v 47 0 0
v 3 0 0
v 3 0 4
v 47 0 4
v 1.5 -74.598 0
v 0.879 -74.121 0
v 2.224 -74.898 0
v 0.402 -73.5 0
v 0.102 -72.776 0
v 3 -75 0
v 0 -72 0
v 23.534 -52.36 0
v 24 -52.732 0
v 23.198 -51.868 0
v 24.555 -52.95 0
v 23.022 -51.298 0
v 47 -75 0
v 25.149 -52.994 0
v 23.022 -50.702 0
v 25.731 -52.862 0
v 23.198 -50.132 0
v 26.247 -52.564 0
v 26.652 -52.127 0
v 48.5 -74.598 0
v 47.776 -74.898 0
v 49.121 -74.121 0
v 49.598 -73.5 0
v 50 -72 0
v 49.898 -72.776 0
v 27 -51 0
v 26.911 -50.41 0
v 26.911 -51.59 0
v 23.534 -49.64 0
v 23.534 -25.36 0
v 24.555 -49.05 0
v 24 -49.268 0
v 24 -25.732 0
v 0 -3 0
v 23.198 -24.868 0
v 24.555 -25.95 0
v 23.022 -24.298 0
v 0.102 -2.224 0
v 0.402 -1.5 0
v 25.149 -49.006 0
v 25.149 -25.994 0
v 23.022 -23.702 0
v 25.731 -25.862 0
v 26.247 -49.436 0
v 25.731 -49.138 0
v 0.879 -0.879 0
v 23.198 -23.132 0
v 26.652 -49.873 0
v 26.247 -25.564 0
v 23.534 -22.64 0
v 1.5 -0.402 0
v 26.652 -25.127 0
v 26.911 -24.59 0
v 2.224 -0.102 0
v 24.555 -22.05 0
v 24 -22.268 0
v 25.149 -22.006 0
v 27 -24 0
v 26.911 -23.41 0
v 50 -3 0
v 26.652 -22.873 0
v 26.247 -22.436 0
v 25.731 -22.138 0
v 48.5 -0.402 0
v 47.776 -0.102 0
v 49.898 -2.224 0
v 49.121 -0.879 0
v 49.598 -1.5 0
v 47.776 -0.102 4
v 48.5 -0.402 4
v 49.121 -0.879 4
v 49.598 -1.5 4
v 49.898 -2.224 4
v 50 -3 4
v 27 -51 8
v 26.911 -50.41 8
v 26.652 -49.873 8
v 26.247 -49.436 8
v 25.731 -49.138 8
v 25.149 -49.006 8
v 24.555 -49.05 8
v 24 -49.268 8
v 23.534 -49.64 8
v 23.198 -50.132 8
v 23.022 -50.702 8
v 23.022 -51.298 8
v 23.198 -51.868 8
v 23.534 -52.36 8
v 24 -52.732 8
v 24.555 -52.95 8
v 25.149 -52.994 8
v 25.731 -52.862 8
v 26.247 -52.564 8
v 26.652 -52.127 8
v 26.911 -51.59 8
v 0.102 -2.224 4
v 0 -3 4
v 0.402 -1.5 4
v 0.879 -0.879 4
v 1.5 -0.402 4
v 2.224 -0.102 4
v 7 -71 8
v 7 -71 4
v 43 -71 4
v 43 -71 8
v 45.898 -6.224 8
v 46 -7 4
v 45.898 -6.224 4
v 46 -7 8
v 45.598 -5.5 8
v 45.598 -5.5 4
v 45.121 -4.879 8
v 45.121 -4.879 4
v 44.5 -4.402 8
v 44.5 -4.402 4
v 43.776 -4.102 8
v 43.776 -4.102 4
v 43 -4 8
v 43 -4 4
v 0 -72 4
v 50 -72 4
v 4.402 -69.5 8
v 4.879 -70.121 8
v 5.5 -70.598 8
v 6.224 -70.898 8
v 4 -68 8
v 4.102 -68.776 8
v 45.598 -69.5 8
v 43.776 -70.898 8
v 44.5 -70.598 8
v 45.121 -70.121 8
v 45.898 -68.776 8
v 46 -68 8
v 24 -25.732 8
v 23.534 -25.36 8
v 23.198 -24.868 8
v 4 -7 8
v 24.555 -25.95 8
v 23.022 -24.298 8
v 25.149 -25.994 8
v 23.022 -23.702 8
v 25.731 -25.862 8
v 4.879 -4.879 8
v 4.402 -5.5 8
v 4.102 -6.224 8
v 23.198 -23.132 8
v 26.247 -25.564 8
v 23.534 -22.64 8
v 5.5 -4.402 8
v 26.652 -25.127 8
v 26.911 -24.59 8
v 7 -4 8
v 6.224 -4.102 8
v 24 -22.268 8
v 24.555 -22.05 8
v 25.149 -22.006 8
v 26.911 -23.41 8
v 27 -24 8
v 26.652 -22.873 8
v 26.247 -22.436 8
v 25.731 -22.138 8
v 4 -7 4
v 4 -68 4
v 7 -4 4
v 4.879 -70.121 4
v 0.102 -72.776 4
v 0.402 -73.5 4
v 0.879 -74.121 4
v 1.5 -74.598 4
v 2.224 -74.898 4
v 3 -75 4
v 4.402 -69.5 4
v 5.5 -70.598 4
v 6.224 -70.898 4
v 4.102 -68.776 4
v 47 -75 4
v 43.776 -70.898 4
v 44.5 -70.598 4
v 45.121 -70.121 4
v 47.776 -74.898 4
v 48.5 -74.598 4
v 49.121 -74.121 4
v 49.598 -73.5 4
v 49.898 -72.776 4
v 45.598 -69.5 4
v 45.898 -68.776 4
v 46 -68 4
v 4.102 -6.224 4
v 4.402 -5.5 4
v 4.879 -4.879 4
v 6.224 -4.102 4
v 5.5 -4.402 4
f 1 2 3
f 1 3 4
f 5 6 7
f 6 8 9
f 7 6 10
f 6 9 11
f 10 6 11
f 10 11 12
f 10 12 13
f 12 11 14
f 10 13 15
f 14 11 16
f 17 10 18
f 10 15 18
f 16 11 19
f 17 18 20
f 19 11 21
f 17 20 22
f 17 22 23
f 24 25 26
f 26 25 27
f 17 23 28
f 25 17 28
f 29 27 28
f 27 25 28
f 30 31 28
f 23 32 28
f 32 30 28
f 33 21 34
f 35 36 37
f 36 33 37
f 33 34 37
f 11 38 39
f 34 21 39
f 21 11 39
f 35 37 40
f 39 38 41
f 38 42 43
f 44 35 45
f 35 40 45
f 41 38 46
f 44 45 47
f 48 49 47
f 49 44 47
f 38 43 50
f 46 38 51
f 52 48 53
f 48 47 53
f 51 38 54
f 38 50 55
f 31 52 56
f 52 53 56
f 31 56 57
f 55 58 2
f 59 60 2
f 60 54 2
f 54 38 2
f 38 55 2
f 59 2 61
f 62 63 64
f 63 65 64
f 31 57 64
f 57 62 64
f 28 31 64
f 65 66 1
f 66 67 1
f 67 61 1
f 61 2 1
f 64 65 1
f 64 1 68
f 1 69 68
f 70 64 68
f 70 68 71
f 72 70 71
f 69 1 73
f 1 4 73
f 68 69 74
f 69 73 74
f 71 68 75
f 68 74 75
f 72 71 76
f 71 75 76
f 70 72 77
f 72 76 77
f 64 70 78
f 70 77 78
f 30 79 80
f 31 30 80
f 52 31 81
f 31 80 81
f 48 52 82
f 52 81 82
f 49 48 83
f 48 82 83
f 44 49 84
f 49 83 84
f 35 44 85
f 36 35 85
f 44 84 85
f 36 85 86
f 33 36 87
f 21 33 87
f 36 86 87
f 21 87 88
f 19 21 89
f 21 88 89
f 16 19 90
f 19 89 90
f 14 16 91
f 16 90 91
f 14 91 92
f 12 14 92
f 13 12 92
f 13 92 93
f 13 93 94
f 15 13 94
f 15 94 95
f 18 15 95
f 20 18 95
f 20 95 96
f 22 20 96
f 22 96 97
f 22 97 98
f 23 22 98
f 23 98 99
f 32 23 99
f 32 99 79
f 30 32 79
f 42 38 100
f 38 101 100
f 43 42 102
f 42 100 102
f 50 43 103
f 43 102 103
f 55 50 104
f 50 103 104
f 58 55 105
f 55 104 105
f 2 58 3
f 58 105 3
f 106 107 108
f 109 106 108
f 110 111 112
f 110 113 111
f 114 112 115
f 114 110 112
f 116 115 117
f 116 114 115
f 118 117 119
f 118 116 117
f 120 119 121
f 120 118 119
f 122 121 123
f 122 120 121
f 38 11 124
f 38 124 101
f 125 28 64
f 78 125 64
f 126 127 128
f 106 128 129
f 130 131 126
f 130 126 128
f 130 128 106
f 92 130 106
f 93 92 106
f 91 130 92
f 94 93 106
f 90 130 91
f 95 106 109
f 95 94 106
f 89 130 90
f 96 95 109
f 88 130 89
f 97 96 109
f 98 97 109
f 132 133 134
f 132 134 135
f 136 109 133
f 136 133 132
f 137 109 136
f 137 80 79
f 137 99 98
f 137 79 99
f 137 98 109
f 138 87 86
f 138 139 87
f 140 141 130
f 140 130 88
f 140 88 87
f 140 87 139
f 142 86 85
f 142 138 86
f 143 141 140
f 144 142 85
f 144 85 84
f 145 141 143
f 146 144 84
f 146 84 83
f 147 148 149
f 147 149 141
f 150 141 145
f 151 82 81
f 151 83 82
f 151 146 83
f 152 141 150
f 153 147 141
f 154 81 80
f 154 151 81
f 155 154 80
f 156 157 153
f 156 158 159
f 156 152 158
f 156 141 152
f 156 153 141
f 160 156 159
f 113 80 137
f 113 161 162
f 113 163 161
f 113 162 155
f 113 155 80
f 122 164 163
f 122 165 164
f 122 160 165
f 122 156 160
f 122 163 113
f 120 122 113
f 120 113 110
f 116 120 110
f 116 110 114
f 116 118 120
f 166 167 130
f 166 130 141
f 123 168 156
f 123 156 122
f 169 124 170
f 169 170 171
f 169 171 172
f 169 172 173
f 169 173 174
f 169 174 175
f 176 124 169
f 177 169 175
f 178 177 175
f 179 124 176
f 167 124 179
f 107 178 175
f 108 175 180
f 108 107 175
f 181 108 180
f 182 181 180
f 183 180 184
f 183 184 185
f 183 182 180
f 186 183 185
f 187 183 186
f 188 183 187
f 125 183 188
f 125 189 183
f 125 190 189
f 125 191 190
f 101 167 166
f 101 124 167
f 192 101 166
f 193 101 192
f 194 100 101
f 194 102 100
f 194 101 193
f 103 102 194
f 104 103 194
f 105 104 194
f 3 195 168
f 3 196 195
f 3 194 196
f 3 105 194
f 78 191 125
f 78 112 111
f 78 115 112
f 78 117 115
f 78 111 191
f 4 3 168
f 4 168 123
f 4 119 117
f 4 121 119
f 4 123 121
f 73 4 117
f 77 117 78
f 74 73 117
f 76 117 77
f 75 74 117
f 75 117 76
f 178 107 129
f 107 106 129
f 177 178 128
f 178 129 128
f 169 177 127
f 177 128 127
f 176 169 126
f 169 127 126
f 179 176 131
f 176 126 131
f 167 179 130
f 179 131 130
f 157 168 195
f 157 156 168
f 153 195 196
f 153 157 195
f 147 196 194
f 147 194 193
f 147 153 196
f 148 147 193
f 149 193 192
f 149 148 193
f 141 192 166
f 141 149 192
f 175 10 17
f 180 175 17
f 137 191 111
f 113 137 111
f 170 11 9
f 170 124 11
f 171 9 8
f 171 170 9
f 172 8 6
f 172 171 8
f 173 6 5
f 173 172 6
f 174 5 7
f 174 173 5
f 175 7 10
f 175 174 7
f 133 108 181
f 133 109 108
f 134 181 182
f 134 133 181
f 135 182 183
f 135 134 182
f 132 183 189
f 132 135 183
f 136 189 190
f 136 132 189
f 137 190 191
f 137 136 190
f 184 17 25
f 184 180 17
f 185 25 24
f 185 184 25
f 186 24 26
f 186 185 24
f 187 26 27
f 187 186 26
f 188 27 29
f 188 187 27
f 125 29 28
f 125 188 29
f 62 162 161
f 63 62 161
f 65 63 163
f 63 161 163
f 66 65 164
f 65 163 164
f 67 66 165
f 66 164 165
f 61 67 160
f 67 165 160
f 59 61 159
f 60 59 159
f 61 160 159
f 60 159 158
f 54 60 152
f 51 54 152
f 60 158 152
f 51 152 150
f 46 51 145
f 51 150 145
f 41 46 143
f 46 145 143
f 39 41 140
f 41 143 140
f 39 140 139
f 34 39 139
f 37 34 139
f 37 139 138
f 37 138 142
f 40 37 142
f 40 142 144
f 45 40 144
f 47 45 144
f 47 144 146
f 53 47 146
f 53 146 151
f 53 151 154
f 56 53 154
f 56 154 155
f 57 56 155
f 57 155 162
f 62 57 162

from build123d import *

# Parameters (mm, degrees)
F0_W     = 50
F0_H     = 75
F1_DEPTH = 4
F2_W     = 42
F2_H     = 67
F3_DEPTH = 4
F4_R     = 3
F5_R     = 2
F6_DEPTH = 25


with BuildPart() as f1:
    # F0 (on Top) → F1 (new body)
    with BuildSketch(Plane.XY):
        with Locations((25, -37.5)):
            Rectangle(F0_W, F0_H)
    extrude(amount=F1_DEPTH)

    # F2 (on face) → F3 (join)
    with BuildSketch(Plane.XY.offset(4)):
        with Locations((25, -37.5)):
            Rectangle(F2_W, F2_H)
    extrude(amount=F3_DEPTH)

    # F4
    f4_edges = [f1.edges().sort_by_distance(p)[0] for p in [
        (50, 0, 2),
        (4, -4, 6),
        (0, 0, 2),
        (46, -4, 6),
        (46, -71, 6),
        (50, -75, 2),
        (4, -71, 6),
        (0, -75, 2),
    ]]
    fillet(f4_edges, radius=F4_R)

    # F5 (on face) → F6 (cut)
    with BuildSketch(Plane.XY.offset(8)):
        with Locations((25, -51)):
            Circle(F5_R)
        with Locations((25, -24)):
            Circle(F5_R)
    extrude(amount=-F6_DEPTH, mode=Mode.SUBTRACT)


solid = f1.part
